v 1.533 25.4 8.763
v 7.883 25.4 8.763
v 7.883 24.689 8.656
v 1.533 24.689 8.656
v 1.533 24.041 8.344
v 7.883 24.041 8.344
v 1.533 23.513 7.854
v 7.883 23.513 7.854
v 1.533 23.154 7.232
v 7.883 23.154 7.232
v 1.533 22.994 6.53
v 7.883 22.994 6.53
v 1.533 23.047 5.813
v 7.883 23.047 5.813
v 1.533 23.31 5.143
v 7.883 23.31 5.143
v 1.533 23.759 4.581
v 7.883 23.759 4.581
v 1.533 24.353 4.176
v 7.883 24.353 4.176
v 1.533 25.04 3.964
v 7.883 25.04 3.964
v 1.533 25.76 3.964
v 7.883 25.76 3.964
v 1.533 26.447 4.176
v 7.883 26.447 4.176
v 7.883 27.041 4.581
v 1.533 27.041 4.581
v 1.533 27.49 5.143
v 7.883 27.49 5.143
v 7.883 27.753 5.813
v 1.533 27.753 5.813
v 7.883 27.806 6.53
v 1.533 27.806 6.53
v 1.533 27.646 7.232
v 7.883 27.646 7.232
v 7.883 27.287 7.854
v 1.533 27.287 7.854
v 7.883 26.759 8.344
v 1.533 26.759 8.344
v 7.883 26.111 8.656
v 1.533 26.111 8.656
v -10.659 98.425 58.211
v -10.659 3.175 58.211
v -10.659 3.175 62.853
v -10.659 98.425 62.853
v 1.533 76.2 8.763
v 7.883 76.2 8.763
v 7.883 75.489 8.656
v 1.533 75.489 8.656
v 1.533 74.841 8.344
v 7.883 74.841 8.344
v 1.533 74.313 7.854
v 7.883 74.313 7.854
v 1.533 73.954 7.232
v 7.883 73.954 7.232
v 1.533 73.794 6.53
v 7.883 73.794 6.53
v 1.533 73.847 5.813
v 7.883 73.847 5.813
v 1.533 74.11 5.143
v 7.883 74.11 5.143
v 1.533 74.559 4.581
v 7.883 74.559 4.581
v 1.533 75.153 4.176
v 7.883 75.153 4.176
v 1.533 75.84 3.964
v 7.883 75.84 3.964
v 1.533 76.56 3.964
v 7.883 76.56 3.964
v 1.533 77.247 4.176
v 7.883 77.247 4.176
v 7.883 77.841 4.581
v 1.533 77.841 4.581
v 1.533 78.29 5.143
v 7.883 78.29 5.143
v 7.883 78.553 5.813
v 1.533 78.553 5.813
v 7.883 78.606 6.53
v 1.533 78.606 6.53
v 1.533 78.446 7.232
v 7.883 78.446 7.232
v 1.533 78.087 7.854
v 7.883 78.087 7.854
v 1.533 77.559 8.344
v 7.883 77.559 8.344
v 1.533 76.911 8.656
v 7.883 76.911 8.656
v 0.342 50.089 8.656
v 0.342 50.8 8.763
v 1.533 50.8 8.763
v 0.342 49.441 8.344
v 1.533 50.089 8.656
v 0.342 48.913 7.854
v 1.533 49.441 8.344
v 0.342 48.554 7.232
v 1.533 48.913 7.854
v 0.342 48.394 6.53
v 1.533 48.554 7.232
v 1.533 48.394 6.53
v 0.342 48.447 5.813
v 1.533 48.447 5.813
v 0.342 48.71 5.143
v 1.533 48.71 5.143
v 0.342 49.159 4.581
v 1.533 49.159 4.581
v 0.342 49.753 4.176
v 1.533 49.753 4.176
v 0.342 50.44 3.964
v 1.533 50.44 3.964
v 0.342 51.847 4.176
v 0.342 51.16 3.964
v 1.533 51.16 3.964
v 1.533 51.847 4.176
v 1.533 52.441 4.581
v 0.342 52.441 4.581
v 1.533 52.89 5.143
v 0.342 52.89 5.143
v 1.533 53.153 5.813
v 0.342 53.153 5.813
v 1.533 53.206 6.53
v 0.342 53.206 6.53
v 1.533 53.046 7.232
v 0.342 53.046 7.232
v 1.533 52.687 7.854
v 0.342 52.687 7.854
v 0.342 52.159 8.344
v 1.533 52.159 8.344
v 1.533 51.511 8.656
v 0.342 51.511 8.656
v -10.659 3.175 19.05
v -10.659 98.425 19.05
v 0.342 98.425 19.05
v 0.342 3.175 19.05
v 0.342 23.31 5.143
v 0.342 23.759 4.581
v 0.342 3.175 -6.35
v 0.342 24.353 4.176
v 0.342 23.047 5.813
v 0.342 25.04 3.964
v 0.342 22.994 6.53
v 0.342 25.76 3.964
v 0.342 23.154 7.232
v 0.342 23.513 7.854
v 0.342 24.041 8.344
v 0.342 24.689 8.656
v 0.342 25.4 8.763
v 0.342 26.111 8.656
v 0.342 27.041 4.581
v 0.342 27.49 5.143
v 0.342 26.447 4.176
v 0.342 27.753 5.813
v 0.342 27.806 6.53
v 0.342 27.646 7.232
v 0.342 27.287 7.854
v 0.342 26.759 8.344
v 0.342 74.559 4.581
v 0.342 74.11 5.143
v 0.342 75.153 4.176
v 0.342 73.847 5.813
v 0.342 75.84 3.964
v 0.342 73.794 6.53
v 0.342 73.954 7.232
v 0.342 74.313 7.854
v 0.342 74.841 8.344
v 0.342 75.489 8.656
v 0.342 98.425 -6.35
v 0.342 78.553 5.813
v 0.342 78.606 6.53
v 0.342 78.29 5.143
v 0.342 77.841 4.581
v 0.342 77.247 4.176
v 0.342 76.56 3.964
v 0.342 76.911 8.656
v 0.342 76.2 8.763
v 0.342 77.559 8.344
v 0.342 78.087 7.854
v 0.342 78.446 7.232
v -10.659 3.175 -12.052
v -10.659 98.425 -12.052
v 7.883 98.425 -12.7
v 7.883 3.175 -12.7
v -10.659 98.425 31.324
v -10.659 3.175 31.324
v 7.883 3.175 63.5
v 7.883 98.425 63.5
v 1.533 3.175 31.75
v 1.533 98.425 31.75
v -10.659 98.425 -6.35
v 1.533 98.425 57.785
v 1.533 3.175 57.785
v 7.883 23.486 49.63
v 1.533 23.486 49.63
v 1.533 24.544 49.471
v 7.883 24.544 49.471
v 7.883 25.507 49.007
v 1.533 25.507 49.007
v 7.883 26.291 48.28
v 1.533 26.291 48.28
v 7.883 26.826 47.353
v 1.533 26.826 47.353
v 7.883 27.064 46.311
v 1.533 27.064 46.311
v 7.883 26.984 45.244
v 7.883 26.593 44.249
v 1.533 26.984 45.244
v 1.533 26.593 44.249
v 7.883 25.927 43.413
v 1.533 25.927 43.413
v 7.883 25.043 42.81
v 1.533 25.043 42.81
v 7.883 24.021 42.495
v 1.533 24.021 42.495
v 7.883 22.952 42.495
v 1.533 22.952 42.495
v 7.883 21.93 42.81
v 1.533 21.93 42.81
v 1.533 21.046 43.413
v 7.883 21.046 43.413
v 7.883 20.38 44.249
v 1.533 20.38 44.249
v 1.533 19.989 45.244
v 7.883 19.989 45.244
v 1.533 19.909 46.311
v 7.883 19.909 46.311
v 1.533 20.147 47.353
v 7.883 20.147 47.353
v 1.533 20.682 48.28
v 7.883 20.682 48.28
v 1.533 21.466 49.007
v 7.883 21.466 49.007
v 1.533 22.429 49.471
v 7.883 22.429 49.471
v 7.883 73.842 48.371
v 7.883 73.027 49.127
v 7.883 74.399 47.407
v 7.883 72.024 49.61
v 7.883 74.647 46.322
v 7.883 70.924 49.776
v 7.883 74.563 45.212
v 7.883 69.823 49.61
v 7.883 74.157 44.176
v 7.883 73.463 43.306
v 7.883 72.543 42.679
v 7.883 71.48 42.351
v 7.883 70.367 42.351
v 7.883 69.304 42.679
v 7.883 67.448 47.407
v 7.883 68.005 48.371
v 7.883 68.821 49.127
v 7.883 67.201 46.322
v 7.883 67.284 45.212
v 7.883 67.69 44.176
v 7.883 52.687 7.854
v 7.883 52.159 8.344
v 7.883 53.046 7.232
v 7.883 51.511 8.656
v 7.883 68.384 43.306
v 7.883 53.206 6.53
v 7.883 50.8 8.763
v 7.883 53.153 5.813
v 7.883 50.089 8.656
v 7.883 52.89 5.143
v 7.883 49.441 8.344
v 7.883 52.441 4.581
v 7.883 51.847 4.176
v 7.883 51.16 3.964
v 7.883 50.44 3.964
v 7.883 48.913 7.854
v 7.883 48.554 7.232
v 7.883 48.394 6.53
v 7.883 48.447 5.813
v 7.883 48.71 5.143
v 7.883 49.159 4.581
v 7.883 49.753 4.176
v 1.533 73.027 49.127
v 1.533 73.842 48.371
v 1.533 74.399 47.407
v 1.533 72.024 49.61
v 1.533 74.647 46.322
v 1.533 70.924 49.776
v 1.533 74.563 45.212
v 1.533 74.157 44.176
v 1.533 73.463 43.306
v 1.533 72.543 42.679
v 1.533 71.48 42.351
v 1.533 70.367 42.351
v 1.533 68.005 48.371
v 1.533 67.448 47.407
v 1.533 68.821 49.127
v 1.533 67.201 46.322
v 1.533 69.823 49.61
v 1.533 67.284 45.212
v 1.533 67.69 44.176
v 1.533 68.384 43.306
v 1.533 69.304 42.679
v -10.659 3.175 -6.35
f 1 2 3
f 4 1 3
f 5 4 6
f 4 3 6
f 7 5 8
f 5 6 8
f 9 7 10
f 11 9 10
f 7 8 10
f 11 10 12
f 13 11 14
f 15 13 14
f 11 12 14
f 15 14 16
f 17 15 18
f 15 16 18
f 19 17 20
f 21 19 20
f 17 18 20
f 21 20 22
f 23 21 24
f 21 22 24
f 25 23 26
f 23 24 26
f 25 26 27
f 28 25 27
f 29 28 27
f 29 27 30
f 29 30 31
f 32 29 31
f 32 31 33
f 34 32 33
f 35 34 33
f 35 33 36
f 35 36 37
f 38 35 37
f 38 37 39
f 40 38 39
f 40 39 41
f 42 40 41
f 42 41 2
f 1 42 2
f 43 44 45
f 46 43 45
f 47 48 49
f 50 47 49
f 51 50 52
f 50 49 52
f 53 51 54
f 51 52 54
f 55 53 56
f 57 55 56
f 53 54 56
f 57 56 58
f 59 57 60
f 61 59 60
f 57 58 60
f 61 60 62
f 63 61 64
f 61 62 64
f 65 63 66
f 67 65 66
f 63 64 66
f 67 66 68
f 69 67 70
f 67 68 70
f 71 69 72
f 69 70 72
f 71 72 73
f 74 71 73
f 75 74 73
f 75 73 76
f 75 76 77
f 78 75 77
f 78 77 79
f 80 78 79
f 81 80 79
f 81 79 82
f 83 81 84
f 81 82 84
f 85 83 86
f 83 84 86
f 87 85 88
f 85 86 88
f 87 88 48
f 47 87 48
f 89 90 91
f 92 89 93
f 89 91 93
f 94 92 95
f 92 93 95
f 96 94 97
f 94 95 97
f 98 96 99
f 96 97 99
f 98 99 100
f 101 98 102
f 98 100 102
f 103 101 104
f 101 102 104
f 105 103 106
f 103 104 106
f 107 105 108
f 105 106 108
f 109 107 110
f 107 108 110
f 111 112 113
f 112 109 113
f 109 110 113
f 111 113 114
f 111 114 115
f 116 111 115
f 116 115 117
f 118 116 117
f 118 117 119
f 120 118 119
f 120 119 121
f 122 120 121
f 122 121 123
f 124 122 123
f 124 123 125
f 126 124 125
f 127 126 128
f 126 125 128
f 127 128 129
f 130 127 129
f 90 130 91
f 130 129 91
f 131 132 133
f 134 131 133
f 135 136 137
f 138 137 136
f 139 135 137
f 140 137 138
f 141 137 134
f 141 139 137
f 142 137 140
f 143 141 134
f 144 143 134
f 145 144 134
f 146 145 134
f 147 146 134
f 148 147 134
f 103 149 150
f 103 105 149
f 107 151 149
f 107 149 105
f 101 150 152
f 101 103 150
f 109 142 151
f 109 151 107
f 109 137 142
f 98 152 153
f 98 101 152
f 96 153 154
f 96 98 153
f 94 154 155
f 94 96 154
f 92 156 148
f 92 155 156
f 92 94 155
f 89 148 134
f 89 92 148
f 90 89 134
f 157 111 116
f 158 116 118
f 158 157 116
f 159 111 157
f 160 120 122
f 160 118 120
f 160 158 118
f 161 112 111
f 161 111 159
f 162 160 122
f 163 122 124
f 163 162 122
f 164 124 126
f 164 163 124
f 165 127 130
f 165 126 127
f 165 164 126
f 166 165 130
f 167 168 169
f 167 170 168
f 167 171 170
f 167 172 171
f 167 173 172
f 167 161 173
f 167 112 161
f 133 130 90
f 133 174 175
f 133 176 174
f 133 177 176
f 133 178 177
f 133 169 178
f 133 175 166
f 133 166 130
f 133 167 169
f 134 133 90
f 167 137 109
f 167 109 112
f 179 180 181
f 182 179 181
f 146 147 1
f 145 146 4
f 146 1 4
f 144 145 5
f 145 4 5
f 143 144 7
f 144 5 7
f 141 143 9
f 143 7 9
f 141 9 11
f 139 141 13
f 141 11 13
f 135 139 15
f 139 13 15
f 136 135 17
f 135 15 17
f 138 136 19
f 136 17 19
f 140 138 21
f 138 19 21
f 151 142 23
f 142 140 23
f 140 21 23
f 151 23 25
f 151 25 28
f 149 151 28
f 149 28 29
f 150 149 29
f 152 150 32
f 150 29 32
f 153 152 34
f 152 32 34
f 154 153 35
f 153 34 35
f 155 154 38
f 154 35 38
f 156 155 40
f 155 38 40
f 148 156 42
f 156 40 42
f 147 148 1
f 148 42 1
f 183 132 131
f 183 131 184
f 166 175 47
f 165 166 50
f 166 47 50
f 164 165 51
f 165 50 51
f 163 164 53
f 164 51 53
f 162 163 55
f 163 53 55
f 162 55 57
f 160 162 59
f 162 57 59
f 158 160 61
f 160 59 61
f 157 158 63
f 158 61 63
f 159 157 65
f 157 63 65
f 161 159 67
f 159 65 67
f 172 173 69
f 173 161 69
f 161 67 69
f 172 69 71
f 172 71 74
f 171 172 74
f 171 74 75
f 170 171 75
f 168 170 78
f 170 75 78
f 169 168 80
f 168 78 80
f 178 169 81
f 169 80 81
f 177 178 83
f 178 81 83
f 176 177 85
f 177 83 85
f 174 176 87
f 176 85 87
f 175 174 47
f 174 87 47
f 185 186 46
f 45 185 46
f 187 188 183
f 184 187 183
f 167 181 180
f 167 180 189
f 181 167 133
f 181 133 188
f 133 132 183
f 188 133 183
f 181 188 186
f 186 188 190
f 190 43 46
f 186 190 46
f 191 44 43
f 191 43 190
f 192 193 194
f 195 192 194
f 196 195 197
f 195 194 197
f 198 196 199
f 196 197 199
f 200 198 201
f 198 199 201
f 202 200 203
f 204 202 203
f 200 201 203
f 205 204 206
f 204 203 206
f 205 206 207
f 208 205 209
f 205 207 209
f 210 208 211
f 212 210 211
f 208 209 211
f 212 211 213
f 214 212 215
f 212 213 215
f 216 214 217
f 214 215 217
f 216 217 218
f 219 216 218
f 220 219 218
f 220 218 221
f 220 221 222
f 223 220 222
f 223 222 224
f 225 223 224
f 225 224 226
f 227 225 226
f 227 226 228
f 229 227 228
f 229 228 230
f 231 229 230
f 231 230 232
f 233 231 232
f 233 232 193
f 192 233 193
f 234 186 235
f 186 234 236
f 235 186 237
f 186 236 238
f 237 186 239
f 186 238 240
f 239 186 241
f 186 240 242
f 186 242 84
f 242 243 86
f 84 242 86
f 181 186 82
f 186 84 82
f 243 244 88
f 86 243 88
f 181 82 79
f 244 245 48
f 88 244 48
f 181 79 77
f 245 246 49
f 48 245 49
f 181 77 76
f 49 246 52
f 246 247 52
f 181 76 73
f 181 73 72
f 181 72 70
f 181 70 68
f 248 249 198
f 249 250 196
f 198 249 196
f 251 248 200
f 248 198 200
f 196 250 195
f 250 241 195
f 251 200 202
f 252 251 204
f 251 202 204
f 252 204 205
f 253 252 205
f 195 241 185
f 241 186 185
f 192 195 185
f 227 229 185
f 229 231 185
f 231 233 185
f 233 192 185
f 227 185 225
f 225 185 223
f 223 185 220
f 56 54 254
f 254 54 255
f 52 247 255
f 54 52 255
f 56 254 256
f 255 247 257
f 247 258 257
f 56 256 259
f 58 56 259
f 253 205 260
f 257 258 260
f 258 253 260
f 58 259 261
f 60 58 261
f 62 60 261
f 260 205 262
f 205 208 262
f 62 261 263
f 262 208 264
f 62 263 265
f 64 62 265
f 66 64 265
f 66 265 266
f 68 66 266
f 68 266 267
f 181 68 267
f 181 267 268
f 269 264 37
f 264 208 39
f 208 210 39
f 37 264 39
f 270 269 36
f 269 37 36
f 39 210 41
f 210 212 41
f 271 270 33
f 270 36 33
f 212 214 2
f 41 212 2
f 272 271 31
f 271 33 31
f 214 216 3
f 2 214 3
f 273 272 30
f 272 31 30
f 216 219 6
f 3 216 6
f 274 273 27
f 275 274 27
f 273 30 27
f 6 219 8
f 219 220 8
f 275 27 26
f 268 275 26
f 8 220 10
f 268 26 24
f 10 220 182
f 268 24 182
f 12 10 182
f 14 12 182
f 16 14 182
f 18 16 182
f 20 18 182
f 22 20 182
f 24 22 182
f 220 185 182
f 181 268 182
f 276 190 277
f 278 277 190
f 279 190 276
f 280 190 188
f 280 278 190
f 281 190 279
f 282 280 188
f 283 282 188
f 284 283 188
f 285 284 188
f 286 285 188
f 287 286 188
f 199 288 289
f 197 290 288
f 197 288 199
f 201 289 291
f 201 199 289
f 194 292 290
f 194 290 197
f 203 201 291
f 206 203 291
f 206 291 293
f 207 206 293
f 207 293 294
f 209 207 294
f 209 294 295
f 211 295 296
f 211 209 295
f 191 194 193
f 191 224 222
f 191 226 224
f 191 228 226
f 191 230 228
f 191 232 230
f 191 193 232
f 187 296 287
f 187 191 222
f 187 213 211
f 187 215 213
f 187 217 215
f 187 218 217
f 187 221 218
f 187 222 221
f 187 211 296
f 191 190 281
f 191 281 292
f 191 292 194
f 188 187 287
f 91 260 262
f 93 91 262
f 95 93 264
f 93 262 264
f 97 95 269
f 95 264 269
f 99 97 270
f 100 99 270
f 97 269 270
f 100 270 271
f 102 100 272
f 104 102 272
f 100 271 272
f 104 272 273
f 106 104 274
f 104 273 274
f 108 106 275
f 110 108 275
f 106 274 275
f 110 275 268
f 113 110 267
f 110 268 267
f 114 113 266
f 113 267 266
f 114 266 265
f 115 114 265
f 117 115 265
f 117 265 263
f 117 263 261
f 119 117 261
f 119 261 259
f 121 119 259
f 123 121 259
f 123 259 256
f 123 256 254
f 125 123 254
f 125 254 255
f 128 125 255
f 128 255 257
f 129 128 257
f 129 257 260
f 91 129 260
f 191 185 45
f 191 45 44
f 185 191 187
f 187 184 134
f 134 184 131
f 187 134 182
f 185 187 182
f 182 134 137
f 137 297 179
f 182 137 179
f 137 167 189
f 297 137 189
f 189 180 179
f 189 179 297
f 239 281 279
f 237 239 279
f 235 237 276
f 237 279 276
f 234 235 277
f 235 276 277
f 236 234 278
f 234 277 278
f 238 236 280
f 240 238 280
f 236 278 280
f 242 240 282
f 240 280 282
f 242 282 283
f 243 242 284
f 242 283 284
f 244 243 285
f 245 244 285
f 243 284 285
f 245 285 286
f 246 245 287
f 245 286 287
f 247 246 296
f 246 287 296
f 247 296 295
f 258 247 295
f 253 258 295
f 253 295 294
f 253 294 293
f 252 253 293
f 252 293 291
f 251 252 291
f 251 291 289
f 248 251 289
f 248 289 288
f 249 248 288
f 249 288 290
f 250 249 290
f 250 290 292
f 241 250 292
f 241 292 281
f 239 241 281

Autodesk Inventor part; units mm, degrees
ref_plane "YZ Plane" through (0, 0, 0) normal (1, 0, 0) x (0, 1, 0)
ref_plane "XZ Plane" through (0, 0, 0) normal (0, 1, 0) x (-1, 0, 0)
ref_plane "XY Plane" through (0, 0, 0) normal (0, 0, 1) x (1, 0, 0)
sketch "Sketch1" plane through (0, 0, 0) normal (0, 1, 0) x (-1, 0, 0)
  line L0 (10.6592, 63.5) -> (-7.8828, 63.5)
  line L1 (-7.8828, 63.5) -> (-7.8828, -12.7)
  line L2 (-7.8828, -12.7) -> (10.6592, -12.7)
  line L3 (10.6592, 57.785) -> (-1.5328, 57.785)
  line L4 (-1.5328, 57.785) -> (-1.5328, 31.75)
  line L5 (-1.5328, 31.75) -> (10.6592, 31.75)
  line L6 (10.6592, 19.05) -> (-1.5328, 19.05)
  line L7 (-1.5328, 19.05) -> (-1.5328, -6.35)
  line L8 (-1.5328, -6.35) -> (10.6592, -6.35)
  line L9 (10.6592, -12.7) -> (10.6592, -6.35)
  line L10 (10.6592, 19.05) -> (10.6592, 31.75)
  line L11 (10.6592, 57.785) -> (10.6592, 63.5)
  point P0 (0, 0)
  dimension "d0" = 18.542
  dimension "d3" = 6.35
  dimension "d4" = 12.7
  dimension "d5" = 5.715
  dimension "d7" = 0
  dimension "d8" = 26.035
  dimension "d9" = 25.4
  dimension "d25" = 0
  dimension "d26" = 0
extrude "Extrusion1" add sketch "Sketch1" along normal blind 101.6
sketch "Sketch2" plane through (1.5328, 0, -6.35) normal (-1, 0, 0) x (0, 0, 1)
  line L0 (0, 0) -> (0, 101.6) projected
  line L1 (0, 0) -> (25.4, 0) projected
  point P0 (6.35, 0)
  point P1 (12.7, 25.4)
  point P2 (12.7, 50.8)
  point P3 (12.7, 76.2)
  dimension "d12" = 12.7
  dimension "d13" = 25.4
  dimension "d14" = 25.4
  dimension "d15" = 0
  dimension "d16" = 0
  dimension "d17" = 25.4
hole "Hole1" at (1.5328, 25.4, 6.35) at (1.5328, 50.8, 6.35) at (1.5328, 76.2, 6.35) direction (1, 0, 0) diameter 4.826 depth 25.4 tip angle 118
sketch "Sketch3" plane through (0, 101.6, 0) normal (0, 1, 0) x (1, 0, 0)
  line L0 (1.5328, -31.75) -> (-10.7917, -31.3196)
  line L1 (-10.7917, -31.3196) -> (-10.7917, -31.75)
  line L2 (-10.6592, -31.75) -> (1.5328, -31.75) projected
  line L3 (-10.7917, -31.75) -> (1.5328, -31.75)
  point P0 (0, 0)
  dimension "d27" = 2
extrude "Extrusion2" cut sketch "Sketch3" against normal blind 111.125
sketch "Sketch4" plane through (0, 101.6, 0) normal (0, 1, 0) x (1, 0, 0)
  line L0 (1.5328, -57.785) -> (-12.9577, -57.785)
  line L1 (-12.9577, -57.785) -> (-12.9577, -58.291)
  line L2 (-12.9577, -58.291) -> (1.5328, -57.785)
  point P0 (0, 0)
  dimension "d30" = 2
extrude "Extrusion3" cut sketch "Sketch4" against normal blind 119.0625
sketch "Sketch5" plane through (0, 101.6, 0) normal (0, 1, 0) x (1, 0, 0)
  line L0 (-10.6592, -63.5) -> (7.8828, -63.5) projected
  line L1 (7.8828, -63.5) -> (-13.0423, -62.7693)
  line L2 (-13.0423, -62.7693) -> (-13.0009, -63.5)
  line L3 (-13.0009, -63.5) -> (7.8828, -63.5)
  point P0 (0, 0)
  dimension "d33" = 2
extrude "Extrusion4" cut sketch "Sketch5" against normal blind 196.85
sketch "Sketch6" plane through (0, 101.6, 0) normal (0, 1, 0) x (1, 0, 0)
  line L0 (7.8828, 12.7) -> (-10.6592, 12.7) projected
  line L1 (7.8828, 12.7) -> (-16.8119, 12.7)
  line L2 (-16.8119, 12.7) -> (-16.8119, 11.8376)
  line L3 (7.8828, -63.5) -> (7.8828, 12.7) projected
  line L4 (-16.8119, 11.8376) -> (7.8828, 12.7)
  point P0 (0, 0)
  dimension "d36" = 2
extrude "Extrusion5" cut sketch "Sketch6" against normal blind 334.9625
sketch "Sketch8" plane through (1.5328, 0, -6.35) normal (-1, 0, 0) x (0, 0, 1)
  line L0 (0, 0) -> (25.4, 0) projected
  circle A0 centre (12.7, 25.4) radius 2.413 projected
  circle A1 centre (12.7, 50.8) radius 2.413 projected
  circle A2 centre (12.7, 76.2) radius 2.413 projected
  line L1 (25.4, 0) -> (25.4, 101.6) projected
  line L2 (0, 0) -> (25.4, 0)
  line L3 (25.4, 0) -> (25.4, 101.6)
  line L4 (25.4, 101.6) -> (0, 101.6)
  line L5 (0, 101.6) -> (0, 0)
  circle A3 centre (12.7, 25.4) radius 2.413
  circle A4 centre (12.7, 50.8) radius 2.413
  circle A5 centre (12.7, 76.2) radius 2.413
  point P0 (6.35, 0)
extrude "Extrusion7" add sketch "Sketch8" along normal blind 1.1906
sketch "Sketch14" plane through (1.5328, 0, 31.75) normal (-1, 0, 0) x (0, 0, 1)
  circle A0 centre (14.2928, 23.4865) radius 3.5876
  circle A1 centre (14.2928, 70.9236) radius 3.7334
  point P0 (-31.75, 0)
extrude "Extrusion11" cut sketch "Sketch14" against normal blind 55.5625
sketch "Sketch15" plane through (-10.6592, 0, 19.05) normal (-1, 0, 0) x (0, 0, 1)
  line L0 (-46.1003, -15.0429) -> (50.4982, -15.0429)
  line L1 (50.4982, -15.0429) -> (50.4982, 3.175)
  line L2 (50.4982, 3.175) -> (-46.1003, 3.175)
  line L3 (-46.1003, 3.175) -> (-46.1003, -15.0429)
  line L4 (0, 0) -> (12.2742, 0) projected
  line L5 (-42.8623, 98.425) -> (49.6887, 98.425)
  line L6 (49.6887, 98.425) -> (49.6887, 110.1573)
  line L7 (49.6887, 110.1573) -> (-42.8623, 110.1573)
  line L8 (-42.8623, 110.1573) -> (-42.8623, 98.425)
  line L9 (0, 101.6) -> (12.2742, 101.6) projected
  point P0 (-19.05, 0)
  dimension "d55" = 3.175
  dimension "d56" = 3.175
extrude "Extrusion12" cut sketch "Sketch15" against normal blind 50.8
equation "\"d0\" = ElvDelWidth"
equation "\"d3\" = ElvDelFrontTabLength"
equation "\"d9\" = ElvBeamWidth"
equation "\"d10\" = ElvDelHeight"
equation "\"ElvBeamWidth\" = 25.4"
equation "\"ElvDelWidth\" = 18.542"
equation "\"ElvDelHeight\" = 101.6"
equation "\"ElvDelFrontTabLength\" = 6.35"
equation "\"ElvDelDepth\" = 6.35"
equation "\"d2\" = ElvDelDepth"
equation "\"ElvCrossBeamLength\" = 304.8"
equation "\"ElvFixedBeamLength\" = 990.6"
equation "\"ElvMiddleBeamLength\" = 990.6"
equation "\"ElvFrontBeamLength\" = 990.6"
equation "\"ElvEndEffectLength\" = 431.8"
equation "\"ElvWallWidth\" = 1.5875"
equation "\"ElvTopBeamLength\" = 457.2"
equation "\"ElvHoleFromFront\" = 25.4"
equation "\"ElvHoleFromMid\" = 38.1"
equation "\"ElvHoleFromFixed\" = 50.8"
equation "\"ElvHoleFromBottom\" = 38.1"
equation "\"ElvRivetPlateLength\" = 76.2"
equation "\"ElvDelMiddleTabLength\" = 6.35"
properties part number "ElvDelV6" material "Acetal Resin, White"
